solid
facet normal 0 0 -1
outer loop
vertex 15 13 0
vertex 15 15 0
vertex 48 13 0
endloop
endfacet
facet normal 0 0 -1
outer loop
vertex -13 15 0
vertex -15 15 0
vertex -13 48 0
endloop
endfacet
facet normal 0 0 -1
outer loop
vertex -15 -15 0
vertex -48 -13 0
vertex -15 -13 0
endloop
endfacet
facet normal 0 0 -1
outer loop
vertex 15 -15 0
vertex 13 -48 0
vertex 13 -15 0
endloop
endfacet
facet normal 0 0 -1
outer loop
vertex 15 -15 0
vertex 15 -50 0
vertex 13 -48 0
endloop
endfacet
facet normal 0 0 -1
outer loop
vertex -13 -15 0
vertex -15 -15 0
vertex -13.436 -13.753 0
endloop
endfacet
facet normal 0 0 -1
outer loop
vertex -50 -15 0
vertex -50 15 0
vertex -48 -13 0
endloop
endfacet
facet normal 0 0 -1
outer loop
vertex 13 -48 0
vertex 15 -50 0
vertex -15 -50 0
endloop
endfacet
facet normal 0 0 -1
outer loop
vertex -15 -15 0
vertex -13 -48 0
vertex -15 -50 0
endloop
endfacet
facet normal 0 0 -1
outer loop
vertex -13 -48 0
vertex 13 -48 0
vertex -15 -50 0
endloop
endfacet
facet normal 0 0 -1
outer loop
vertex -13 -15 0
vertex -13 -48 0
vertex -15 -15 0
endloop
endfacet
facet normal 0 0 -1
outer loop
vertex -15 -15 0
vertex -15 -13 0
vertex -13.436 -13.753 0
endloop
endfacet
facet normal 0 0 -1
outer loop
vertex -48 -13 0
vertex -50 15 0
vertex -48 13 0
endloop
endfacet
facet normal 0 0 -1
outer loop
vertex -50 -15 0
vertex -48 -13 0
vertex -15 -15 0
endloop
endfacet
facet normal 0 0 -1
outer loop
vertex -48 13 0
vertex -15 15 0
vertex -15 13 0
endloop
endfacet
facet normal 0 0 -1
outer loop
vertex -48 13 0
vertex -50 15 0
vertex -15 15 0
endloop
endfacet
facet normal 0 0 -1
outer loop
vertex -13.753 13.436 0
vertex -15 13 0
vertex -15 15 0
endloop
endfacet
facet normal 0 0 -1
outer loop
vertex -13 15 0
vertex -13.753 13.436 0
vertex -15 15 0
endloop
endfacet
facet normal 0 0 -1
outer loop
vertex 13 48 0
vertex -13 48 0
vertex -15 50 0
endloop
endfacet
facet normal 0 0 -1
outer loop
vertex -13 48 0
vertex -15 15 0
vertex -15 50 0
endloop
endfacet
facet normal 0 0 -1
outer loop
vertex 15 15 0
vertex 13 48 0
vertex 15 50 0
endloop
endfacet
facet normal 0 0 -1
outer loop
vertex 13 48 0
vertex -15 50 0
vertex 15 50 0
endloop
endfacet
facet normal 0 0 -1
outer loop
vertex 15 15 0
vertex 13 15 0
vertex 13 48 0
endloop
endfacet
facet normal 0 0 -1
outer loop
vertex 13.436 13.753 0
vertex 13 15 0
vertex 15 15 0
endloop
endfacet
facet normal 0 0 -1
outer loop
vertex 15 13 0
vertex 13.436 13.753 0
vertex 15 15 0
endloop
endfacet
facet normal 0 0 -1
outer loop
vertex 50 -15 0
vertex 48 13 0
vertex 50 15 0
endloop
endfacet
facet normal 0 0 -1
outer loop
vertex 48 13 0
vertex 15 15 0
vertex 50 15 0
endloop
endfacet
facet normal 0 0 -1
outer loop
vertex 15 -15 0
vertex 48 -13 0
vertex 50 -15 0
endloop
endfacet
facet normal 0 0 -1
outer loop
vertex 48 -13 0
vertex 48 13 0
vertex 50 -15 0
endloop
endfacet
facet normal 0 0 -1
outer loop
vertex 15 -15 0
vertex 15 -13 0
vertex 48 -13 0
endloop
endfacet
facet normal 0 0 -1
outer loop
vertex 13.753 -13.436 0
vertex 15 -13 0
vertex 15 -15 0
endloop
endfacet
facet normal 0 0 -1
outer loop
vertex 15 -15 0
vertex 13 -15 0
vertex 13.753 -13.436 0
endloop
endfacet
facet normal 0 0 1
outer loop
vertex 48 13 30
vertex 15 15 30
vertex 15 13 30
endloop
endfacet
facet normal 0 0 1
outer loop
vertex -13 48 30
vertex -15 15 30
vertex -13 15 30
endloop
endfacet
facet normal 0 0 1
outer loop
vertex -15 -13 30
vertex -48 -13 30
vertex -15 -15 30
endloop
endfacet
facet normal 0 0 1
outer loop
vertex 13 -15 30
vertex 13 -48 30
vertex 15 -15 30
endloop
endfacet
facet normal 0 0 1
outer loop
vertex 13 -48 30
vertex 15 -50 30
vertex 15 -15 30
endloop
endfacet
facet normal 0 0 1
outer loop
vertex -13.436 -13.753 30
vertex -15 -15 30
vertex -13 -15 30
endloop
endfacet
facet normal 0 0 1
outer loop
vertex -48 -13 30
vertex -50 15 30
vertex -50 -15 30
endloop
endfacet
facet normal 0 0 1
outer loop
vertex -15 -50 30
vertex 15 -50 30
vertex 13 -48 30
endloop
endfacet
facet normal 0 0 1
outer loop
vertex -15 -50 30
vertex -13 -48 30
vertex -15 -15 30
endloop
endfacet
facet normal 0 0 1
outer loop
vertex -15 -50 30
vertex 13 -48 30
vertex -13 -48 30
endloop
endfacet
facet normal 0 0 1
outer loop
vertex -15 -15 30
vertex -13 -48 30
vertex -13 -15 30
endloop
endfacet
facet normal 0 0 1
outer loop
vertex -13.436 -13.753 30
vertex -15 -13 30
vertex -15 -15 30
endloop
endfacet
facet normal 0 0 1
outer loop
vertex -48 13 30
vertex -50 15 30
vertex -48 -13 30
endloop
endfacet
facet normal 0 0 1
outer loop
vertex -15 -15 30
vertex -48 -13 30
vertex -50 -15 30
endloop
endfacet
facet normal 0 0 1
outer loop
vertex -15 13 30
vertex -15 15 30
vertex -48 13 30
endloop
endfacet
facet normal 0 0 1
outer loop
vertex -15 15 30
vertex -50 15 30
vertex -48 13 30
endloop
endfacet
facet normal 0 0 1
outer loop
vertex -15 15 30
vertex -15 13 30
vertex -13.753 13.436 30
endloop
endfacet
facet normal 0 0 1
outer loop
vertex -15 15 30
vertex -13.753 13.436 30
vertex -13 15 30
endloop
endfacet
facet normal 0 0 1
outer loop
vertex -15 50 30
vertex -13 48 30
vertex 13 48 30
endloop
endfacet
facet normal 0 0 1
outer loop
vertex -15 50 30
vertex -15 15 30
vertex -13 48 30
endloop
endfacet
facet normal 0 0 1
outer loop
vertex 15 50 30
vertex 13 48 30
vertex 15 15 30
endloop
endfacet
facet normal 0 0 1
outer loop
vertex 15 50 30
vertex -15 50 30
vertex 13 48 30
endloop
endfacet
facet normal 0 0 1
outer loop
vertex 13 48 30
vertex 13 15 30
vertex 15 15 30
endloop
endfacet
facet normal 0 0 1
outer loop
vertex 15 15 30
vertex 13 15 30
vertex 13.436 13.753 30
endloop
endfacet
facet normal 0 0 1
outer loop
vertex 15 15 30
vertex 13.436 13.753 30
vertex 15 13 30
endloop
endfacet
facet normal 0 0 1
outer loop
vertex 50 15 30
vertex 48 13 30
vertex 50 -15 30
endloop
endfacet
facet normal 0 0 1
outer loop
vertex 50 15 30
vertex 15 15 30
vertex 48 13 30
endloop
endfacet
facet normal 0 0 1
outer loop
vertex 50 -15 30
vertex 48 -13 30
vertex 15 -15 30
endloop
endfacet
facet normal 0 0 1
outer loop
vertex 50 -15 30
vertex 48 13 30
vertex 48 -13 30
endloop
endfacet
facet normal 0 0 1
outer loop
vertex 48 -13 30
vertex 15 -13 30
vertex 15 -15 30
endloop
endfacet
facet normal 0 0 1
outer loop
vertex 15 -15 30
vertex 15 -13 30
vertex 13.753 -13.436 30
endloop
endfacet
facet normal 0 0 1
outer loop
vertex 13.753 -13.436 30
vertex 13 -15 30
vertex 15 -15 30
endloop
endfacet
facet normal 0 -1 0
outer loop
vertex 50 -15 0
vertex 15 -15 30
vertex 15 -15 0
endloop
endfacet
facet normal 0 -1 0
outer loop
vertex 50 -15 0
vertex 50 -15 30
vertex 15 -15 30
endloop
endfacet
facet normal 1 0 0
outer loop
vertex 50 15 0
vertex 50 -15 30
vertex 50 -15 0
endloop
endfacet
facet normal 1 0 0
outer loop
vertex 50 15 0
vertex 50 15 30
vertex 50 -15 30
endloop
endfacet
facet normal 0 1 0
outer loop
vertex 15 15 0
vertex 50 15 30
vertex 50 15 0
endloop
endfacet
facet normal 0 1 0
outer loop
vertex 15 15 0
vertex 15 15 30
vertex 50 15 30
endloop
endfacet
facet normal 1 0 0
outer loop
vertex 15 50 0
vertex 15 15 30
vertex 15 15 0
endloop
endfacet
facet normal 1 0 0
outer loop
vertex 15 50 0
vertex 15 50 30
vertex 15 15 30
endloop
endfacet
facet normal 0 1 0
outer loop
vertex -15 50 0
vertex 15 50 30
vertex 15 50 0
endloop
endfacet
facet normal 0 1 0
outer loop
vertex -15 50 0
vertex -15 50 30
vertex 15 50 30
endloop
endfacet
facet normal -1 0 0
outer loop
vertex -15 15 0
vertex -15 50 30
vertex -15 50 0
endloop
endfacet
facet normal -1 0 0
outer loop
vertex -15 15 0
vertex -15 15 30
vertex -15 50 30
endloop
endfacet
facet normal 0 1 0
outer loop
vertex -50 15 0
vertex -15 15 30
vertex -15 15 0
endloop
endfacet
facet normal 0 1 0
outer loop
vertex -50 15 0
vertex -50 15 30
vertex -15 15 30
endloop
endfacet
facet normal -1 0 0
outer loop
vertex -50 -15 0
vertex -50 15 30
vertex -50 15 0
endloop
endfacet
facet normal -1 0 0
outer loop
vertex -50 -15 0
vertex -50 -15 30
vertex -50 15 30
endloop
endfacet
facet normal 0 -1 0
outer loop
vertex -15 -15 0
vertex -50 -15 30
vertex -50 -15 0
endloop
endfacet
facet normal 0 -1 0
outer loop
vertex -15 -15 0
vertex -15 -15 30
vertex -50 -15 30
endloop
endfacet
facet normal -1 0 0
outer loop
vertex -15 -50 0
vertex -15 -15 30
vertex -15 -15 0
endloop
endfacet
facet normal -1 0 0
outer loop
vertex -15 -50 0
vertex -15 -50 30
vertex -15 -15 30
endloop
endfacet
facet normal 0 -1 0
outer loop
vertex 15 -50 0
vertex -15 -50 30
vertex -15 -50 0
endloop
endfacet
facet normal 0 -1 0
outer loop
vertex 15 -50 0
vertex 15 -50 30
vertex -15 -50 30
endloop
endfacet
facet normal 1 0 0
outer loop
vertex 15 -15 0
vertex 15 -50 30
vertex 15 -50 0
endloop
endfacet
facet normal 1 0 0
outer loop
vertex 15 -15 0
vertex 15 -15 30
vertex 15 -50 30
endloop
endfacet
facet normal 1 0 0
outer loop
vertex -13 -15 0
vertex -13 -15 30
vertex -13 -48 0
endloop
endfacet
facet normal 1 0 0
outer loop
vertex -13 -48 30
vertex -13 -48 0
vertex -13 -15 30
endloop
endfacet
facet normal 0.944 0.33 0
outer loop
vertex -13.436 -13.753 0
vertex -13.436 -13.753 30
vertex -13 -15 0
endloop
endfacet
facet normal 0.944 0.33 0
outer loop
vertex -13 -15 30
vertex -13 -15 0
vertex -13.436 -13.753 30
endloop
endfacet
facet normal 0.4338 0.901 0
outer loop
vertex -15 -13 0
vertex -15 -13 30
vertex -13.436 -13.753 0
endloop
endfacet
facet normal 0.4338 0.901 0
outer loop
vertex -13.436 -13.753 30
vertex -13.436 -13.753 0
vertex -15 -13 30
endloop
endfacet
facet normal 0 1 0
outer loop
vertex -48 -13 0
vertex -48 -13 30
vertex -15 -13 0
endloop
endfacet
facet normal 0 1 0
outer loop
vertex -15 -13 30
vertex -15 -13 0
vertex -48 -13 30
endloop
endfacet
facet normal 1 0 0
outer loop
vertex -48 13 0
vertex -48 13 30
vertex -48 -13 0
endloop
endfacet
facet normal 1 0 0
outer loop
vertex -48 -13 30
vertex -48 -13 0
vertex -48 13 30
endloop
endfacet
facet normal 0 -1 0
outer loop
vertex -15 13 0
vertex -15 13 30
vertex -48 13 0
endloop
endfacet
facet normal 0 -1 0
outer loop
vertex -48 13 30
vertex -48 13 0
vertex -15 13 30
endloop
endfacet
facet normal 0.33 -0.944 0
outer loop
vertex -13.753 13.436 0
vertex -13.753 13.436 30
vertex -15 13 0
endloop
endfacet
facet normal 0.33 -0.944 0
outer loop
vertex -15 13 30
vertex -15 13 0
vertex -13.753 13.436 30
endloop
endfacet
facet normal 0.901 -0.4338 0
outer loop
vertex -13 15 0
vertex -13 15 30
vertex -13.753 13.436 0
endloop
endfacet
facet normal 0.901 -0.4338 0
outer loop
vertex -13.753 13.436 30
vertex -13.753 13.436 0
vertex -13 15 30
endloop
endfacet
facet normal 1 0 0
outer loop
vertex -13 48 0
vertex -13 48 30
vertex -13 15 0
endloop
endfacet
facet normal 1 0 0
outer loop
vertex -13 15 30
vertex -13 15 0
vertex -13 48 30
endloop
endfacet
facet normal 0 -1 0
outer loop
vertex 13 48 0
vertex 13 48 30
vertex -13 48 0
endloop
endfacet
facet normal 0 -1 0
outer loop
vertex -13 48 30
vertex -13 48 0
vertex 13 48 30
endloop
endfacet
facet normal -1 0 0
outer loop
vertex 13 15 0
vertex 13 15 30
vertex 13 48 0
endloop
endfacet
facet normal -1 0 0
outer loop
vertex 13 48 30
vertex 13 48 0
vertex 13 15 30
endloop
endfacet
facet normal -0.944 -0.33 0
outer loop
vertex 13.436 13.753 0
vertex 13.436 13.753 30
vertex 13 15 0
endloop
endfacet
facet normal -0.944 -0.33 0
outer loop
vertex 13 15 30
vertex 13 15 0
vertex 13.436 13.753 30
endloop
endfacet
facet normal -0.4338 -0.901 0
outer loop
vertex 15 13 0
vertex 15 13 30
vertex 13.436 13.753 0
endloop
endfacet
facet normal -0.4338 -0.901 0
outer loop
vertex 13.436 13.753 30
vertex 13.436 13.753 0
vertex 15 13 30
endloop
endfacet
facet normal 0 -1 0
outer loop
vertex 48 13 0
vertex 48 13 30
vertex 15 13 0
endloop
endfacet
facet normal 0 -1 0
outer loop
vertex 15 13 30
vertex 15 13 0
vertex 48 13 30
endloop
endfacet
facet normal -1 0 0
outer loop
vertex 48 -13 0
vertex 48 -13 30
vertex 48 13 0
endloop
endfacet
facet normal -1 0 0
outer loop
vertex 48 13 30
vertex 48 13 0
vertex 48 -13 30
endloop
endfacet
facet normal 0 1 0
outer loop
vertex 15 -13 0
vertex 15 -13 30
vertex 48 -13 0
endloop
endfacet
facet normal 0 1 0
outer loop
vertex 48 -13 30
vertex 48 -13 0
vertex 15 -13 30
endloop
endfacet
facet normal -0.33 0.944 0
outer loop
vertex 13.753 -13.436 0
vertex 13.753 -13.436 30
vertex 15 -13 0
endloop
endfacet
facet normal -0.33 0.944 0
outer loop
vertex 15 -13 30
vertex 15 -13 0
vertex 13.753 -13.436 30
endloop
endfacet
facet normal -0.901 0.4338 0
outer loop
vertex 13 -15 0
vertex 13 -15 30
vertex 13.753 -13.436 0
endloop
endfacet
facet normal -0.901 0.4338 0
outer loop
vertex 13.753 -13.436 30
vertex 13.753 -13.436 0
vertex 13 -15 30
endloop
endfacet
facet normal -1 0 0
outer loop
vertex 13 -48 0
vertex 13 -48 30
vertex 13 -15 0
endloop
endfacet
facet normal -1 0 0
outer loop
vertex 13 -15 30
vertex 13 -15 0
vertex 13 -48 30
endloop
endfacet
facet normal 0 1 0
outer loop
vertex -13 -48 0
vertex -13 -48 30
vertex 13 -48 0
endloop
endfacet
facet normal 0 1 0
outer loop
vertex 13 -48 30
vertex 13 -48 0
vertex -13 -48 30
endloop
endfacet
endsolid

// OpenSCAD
linear_extrude(30) {
  difference() {
    union() {
      square([100, 30], center=true);
      square([30, 100], center=true);
    }
    offset(-2) {
      square([100, 30], center=true);
      square([30, 100], center=true);
    }
  }
}
